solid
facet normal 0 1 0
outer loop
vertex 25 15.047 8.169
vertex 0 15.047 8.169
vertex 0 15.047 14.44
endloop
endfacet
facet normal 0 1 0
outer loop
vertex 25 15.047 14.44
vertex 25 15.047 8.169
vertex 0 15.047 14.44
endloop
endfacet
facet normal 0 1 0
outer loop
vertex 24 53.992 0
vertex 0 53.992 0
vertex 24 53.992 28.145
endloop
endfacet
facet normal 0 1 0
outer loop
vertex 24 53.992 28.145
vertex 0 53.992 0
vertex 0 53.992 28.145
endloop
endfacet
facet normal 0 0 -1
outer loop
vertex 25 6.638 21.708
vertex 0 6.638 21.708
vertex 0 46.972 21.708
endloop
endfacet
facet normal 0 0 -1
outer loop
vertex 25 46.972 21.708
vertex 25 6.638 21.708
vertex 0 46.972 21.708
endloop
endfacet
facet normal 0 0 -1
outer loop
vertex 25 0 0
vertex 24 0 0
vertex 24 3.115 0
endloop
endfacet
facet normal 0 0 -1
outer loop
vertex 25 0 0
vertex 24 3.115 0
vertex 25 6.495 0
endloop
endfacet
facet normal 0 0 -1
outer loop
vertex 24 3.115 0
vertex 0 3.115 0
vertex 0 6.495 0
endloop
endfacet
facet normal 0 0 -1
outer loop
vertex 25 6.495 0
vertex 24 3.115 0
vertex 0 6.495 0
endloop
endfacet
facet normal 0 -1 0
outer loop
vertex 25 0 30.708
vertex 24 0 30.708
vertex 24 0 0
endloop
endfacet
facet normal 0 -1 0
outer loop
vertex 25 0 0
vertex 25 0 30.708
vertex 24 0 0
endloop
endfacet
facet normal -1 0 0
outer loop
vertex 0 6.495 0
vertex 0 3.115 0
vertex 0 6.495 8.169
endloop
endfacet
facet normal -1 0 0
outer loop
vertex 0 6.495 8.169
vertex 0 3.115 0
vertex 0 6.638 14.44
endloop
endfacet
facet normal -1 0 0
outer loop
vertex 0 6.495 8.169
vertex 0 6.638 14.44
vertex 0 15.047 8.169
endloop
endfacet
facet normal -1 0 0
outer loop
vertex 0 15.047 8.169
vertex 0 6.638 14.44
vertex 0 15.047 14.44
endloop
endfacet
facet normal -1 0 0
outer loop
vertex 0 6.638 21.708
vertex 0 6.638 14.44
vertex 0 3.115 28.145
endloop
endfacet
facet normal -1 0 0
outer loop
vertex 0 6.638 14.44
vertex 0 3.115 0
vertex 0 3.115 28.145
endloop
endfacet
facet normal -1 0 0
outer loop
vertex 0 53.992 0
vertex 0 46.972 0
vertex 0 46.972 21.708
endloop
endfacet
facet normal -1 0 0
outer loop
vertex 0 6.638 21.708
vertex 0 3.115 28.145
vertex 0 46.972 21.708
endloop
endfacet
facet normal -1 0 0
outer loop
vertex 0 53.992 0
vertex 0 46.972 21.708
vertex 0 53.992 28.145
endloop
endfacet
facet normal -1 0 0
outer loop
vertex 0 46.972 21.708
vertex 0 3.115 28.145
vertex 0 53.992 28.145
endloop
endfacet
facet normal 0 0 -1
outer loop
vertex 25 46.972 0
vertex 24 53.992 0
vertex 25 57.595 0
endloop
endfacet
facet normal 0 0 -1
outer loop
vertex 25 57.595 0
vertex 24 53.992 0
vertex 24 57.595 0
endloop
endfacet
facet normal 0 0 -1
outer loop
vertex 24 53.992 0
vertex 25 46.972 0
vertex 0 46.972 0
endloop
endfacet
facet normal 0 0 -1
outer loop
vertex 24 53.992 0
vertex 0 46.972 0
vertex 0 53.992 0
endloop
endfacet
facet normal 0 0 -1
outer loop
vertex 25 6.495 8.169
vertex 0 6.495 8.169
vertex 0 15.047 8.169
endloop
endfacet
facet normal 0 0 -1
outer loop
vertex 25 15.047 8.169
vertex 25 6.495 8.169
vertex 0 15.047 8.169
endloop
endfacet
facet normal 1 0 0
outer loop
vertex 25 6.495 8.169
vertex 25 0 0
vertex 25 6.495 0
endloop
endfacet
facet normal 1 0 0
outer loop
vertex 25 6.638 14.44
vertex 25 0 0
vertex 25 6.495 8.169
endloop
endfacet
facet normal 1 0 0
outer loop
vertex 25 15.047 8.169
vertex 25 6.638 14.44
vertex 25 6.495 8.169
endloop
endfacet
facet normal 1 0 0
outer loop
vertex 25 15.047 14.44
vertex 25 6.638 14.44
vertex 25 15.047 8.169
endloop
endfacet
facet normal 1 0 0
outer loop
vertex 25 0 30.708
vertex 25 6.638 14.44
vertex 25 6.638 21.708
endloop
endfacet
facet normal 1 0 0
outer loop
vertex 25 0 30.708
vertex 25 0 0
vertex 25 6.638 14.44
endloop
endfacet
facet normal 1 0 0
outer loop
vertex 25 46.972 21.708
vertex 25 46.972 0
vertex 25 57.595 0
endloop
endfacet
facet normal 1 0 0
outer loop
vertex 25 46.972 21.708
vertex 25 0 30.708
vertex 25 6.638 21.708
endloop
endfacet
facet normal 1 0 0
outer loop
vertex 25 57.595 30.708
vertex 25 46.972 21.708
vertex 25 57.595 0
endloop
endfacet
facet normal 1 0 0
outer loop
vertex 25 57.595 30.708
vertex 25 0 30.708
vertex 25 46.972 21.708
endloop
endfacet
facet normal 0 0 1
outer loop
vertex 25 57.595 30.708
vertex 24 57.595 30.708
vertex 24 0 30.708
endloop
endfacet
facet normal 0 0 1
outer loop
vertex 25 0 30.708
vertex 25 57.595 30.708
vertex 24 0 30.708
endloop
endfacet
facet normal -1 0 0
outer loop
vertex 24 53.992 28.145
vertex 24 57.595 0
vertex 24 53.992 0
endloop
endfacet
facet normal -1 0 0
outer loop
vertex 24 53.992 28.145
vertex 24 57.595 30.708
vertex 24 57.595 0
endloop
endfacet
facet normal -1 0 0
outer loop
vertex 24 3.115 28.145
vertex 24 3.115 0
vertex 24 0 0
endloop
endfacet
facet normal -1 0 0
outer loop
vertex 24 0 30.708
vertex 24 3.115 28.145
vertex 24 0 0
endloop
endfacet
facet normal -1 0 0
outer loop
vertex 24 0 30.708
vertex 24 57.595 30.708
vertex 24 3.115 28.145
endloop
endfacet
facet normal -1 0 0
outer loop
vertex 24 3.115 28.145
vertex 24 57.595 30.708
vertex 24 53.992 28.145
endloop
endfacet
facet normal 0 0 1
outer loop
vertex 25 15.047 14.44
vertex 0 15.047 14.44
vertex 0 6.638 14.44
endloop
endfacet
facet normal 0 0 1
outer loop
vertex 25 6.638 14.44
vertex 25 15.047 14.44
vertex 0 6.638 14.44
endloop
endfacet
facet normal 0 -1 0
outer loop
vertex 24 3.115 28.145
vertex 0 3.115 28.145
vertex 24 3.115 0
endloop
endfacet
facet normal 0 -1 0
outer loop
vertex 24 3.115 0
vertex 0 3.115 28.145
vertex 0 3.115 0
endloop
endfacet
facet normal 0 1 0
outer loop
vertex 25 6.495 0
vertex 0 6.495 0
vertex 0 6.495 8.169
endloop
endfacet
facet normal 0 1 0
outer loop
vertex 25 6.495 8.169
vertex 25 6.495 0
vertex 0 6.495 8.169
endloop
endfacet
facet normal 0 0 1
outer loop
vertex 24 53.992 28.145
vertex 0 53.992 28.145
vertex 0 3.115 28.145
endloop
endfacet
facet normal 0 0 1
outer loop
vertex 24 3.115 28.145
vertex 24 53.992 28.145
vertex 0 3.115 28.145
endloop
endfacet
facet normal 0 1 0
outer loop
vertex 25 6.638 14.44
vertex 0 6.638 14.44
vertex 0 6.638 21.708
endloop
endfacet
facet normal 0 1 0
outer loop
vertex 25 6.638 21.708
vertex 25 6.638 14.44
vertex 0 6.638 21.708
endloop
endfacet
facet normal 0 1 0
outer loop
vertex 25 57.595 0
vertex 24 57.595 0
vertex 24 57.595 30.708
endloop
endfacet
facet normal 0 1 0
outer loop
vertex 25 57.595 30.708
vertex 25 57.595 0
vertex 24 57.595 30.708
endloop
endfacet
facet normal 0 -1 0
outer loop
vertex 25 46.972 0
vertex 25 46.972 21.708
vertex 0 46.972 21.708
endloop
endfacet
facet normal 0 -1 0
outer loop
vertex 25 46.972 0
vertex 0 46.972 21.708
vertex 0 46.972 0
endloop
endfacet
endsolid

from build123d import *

# Parameters (mm, degrees)
F1_DEPTH = 25
F3_DEPTH = 24


with BuildPart() as f1:
    # F0 (on Right) → F1 (new body)
    with BuildSketch(Plane.YZ):
        Polygon((0, 30.708406), (0, 0), (6.495294, 0), (6.495294, 8.168684), (15.046757, 8.168684), (15.046757, 14.439756), (6.637818, 14.439756), (6.637818, 21.7085), (46.972219, 21.7085), (46.972219, 0), (57.595324, 0), (57.595324, 30.708406), align=None)
    extrude(amount=F1_DEPTH)

    # F2 (on face) → F3 (cut)
    with BuildSketch(Plane(origin=(0, 0, 0), x_dir=(0, -1, 0), z_dir=(-1, 0, 0))):
        Polygon((-53.99179, -2.160003), (-53.99179, 28.144645), (-3.114748, 28.144645), (-3.114748, 0), (2.5671, 0), (2.5671, 33.474556), (-65.965217, 33.474556), (-65.965217, -2.160003), align=None)
    extrude(amount=-F3_DEPTH, mode=Mode.SUBTRACT)


solid = f1.part
